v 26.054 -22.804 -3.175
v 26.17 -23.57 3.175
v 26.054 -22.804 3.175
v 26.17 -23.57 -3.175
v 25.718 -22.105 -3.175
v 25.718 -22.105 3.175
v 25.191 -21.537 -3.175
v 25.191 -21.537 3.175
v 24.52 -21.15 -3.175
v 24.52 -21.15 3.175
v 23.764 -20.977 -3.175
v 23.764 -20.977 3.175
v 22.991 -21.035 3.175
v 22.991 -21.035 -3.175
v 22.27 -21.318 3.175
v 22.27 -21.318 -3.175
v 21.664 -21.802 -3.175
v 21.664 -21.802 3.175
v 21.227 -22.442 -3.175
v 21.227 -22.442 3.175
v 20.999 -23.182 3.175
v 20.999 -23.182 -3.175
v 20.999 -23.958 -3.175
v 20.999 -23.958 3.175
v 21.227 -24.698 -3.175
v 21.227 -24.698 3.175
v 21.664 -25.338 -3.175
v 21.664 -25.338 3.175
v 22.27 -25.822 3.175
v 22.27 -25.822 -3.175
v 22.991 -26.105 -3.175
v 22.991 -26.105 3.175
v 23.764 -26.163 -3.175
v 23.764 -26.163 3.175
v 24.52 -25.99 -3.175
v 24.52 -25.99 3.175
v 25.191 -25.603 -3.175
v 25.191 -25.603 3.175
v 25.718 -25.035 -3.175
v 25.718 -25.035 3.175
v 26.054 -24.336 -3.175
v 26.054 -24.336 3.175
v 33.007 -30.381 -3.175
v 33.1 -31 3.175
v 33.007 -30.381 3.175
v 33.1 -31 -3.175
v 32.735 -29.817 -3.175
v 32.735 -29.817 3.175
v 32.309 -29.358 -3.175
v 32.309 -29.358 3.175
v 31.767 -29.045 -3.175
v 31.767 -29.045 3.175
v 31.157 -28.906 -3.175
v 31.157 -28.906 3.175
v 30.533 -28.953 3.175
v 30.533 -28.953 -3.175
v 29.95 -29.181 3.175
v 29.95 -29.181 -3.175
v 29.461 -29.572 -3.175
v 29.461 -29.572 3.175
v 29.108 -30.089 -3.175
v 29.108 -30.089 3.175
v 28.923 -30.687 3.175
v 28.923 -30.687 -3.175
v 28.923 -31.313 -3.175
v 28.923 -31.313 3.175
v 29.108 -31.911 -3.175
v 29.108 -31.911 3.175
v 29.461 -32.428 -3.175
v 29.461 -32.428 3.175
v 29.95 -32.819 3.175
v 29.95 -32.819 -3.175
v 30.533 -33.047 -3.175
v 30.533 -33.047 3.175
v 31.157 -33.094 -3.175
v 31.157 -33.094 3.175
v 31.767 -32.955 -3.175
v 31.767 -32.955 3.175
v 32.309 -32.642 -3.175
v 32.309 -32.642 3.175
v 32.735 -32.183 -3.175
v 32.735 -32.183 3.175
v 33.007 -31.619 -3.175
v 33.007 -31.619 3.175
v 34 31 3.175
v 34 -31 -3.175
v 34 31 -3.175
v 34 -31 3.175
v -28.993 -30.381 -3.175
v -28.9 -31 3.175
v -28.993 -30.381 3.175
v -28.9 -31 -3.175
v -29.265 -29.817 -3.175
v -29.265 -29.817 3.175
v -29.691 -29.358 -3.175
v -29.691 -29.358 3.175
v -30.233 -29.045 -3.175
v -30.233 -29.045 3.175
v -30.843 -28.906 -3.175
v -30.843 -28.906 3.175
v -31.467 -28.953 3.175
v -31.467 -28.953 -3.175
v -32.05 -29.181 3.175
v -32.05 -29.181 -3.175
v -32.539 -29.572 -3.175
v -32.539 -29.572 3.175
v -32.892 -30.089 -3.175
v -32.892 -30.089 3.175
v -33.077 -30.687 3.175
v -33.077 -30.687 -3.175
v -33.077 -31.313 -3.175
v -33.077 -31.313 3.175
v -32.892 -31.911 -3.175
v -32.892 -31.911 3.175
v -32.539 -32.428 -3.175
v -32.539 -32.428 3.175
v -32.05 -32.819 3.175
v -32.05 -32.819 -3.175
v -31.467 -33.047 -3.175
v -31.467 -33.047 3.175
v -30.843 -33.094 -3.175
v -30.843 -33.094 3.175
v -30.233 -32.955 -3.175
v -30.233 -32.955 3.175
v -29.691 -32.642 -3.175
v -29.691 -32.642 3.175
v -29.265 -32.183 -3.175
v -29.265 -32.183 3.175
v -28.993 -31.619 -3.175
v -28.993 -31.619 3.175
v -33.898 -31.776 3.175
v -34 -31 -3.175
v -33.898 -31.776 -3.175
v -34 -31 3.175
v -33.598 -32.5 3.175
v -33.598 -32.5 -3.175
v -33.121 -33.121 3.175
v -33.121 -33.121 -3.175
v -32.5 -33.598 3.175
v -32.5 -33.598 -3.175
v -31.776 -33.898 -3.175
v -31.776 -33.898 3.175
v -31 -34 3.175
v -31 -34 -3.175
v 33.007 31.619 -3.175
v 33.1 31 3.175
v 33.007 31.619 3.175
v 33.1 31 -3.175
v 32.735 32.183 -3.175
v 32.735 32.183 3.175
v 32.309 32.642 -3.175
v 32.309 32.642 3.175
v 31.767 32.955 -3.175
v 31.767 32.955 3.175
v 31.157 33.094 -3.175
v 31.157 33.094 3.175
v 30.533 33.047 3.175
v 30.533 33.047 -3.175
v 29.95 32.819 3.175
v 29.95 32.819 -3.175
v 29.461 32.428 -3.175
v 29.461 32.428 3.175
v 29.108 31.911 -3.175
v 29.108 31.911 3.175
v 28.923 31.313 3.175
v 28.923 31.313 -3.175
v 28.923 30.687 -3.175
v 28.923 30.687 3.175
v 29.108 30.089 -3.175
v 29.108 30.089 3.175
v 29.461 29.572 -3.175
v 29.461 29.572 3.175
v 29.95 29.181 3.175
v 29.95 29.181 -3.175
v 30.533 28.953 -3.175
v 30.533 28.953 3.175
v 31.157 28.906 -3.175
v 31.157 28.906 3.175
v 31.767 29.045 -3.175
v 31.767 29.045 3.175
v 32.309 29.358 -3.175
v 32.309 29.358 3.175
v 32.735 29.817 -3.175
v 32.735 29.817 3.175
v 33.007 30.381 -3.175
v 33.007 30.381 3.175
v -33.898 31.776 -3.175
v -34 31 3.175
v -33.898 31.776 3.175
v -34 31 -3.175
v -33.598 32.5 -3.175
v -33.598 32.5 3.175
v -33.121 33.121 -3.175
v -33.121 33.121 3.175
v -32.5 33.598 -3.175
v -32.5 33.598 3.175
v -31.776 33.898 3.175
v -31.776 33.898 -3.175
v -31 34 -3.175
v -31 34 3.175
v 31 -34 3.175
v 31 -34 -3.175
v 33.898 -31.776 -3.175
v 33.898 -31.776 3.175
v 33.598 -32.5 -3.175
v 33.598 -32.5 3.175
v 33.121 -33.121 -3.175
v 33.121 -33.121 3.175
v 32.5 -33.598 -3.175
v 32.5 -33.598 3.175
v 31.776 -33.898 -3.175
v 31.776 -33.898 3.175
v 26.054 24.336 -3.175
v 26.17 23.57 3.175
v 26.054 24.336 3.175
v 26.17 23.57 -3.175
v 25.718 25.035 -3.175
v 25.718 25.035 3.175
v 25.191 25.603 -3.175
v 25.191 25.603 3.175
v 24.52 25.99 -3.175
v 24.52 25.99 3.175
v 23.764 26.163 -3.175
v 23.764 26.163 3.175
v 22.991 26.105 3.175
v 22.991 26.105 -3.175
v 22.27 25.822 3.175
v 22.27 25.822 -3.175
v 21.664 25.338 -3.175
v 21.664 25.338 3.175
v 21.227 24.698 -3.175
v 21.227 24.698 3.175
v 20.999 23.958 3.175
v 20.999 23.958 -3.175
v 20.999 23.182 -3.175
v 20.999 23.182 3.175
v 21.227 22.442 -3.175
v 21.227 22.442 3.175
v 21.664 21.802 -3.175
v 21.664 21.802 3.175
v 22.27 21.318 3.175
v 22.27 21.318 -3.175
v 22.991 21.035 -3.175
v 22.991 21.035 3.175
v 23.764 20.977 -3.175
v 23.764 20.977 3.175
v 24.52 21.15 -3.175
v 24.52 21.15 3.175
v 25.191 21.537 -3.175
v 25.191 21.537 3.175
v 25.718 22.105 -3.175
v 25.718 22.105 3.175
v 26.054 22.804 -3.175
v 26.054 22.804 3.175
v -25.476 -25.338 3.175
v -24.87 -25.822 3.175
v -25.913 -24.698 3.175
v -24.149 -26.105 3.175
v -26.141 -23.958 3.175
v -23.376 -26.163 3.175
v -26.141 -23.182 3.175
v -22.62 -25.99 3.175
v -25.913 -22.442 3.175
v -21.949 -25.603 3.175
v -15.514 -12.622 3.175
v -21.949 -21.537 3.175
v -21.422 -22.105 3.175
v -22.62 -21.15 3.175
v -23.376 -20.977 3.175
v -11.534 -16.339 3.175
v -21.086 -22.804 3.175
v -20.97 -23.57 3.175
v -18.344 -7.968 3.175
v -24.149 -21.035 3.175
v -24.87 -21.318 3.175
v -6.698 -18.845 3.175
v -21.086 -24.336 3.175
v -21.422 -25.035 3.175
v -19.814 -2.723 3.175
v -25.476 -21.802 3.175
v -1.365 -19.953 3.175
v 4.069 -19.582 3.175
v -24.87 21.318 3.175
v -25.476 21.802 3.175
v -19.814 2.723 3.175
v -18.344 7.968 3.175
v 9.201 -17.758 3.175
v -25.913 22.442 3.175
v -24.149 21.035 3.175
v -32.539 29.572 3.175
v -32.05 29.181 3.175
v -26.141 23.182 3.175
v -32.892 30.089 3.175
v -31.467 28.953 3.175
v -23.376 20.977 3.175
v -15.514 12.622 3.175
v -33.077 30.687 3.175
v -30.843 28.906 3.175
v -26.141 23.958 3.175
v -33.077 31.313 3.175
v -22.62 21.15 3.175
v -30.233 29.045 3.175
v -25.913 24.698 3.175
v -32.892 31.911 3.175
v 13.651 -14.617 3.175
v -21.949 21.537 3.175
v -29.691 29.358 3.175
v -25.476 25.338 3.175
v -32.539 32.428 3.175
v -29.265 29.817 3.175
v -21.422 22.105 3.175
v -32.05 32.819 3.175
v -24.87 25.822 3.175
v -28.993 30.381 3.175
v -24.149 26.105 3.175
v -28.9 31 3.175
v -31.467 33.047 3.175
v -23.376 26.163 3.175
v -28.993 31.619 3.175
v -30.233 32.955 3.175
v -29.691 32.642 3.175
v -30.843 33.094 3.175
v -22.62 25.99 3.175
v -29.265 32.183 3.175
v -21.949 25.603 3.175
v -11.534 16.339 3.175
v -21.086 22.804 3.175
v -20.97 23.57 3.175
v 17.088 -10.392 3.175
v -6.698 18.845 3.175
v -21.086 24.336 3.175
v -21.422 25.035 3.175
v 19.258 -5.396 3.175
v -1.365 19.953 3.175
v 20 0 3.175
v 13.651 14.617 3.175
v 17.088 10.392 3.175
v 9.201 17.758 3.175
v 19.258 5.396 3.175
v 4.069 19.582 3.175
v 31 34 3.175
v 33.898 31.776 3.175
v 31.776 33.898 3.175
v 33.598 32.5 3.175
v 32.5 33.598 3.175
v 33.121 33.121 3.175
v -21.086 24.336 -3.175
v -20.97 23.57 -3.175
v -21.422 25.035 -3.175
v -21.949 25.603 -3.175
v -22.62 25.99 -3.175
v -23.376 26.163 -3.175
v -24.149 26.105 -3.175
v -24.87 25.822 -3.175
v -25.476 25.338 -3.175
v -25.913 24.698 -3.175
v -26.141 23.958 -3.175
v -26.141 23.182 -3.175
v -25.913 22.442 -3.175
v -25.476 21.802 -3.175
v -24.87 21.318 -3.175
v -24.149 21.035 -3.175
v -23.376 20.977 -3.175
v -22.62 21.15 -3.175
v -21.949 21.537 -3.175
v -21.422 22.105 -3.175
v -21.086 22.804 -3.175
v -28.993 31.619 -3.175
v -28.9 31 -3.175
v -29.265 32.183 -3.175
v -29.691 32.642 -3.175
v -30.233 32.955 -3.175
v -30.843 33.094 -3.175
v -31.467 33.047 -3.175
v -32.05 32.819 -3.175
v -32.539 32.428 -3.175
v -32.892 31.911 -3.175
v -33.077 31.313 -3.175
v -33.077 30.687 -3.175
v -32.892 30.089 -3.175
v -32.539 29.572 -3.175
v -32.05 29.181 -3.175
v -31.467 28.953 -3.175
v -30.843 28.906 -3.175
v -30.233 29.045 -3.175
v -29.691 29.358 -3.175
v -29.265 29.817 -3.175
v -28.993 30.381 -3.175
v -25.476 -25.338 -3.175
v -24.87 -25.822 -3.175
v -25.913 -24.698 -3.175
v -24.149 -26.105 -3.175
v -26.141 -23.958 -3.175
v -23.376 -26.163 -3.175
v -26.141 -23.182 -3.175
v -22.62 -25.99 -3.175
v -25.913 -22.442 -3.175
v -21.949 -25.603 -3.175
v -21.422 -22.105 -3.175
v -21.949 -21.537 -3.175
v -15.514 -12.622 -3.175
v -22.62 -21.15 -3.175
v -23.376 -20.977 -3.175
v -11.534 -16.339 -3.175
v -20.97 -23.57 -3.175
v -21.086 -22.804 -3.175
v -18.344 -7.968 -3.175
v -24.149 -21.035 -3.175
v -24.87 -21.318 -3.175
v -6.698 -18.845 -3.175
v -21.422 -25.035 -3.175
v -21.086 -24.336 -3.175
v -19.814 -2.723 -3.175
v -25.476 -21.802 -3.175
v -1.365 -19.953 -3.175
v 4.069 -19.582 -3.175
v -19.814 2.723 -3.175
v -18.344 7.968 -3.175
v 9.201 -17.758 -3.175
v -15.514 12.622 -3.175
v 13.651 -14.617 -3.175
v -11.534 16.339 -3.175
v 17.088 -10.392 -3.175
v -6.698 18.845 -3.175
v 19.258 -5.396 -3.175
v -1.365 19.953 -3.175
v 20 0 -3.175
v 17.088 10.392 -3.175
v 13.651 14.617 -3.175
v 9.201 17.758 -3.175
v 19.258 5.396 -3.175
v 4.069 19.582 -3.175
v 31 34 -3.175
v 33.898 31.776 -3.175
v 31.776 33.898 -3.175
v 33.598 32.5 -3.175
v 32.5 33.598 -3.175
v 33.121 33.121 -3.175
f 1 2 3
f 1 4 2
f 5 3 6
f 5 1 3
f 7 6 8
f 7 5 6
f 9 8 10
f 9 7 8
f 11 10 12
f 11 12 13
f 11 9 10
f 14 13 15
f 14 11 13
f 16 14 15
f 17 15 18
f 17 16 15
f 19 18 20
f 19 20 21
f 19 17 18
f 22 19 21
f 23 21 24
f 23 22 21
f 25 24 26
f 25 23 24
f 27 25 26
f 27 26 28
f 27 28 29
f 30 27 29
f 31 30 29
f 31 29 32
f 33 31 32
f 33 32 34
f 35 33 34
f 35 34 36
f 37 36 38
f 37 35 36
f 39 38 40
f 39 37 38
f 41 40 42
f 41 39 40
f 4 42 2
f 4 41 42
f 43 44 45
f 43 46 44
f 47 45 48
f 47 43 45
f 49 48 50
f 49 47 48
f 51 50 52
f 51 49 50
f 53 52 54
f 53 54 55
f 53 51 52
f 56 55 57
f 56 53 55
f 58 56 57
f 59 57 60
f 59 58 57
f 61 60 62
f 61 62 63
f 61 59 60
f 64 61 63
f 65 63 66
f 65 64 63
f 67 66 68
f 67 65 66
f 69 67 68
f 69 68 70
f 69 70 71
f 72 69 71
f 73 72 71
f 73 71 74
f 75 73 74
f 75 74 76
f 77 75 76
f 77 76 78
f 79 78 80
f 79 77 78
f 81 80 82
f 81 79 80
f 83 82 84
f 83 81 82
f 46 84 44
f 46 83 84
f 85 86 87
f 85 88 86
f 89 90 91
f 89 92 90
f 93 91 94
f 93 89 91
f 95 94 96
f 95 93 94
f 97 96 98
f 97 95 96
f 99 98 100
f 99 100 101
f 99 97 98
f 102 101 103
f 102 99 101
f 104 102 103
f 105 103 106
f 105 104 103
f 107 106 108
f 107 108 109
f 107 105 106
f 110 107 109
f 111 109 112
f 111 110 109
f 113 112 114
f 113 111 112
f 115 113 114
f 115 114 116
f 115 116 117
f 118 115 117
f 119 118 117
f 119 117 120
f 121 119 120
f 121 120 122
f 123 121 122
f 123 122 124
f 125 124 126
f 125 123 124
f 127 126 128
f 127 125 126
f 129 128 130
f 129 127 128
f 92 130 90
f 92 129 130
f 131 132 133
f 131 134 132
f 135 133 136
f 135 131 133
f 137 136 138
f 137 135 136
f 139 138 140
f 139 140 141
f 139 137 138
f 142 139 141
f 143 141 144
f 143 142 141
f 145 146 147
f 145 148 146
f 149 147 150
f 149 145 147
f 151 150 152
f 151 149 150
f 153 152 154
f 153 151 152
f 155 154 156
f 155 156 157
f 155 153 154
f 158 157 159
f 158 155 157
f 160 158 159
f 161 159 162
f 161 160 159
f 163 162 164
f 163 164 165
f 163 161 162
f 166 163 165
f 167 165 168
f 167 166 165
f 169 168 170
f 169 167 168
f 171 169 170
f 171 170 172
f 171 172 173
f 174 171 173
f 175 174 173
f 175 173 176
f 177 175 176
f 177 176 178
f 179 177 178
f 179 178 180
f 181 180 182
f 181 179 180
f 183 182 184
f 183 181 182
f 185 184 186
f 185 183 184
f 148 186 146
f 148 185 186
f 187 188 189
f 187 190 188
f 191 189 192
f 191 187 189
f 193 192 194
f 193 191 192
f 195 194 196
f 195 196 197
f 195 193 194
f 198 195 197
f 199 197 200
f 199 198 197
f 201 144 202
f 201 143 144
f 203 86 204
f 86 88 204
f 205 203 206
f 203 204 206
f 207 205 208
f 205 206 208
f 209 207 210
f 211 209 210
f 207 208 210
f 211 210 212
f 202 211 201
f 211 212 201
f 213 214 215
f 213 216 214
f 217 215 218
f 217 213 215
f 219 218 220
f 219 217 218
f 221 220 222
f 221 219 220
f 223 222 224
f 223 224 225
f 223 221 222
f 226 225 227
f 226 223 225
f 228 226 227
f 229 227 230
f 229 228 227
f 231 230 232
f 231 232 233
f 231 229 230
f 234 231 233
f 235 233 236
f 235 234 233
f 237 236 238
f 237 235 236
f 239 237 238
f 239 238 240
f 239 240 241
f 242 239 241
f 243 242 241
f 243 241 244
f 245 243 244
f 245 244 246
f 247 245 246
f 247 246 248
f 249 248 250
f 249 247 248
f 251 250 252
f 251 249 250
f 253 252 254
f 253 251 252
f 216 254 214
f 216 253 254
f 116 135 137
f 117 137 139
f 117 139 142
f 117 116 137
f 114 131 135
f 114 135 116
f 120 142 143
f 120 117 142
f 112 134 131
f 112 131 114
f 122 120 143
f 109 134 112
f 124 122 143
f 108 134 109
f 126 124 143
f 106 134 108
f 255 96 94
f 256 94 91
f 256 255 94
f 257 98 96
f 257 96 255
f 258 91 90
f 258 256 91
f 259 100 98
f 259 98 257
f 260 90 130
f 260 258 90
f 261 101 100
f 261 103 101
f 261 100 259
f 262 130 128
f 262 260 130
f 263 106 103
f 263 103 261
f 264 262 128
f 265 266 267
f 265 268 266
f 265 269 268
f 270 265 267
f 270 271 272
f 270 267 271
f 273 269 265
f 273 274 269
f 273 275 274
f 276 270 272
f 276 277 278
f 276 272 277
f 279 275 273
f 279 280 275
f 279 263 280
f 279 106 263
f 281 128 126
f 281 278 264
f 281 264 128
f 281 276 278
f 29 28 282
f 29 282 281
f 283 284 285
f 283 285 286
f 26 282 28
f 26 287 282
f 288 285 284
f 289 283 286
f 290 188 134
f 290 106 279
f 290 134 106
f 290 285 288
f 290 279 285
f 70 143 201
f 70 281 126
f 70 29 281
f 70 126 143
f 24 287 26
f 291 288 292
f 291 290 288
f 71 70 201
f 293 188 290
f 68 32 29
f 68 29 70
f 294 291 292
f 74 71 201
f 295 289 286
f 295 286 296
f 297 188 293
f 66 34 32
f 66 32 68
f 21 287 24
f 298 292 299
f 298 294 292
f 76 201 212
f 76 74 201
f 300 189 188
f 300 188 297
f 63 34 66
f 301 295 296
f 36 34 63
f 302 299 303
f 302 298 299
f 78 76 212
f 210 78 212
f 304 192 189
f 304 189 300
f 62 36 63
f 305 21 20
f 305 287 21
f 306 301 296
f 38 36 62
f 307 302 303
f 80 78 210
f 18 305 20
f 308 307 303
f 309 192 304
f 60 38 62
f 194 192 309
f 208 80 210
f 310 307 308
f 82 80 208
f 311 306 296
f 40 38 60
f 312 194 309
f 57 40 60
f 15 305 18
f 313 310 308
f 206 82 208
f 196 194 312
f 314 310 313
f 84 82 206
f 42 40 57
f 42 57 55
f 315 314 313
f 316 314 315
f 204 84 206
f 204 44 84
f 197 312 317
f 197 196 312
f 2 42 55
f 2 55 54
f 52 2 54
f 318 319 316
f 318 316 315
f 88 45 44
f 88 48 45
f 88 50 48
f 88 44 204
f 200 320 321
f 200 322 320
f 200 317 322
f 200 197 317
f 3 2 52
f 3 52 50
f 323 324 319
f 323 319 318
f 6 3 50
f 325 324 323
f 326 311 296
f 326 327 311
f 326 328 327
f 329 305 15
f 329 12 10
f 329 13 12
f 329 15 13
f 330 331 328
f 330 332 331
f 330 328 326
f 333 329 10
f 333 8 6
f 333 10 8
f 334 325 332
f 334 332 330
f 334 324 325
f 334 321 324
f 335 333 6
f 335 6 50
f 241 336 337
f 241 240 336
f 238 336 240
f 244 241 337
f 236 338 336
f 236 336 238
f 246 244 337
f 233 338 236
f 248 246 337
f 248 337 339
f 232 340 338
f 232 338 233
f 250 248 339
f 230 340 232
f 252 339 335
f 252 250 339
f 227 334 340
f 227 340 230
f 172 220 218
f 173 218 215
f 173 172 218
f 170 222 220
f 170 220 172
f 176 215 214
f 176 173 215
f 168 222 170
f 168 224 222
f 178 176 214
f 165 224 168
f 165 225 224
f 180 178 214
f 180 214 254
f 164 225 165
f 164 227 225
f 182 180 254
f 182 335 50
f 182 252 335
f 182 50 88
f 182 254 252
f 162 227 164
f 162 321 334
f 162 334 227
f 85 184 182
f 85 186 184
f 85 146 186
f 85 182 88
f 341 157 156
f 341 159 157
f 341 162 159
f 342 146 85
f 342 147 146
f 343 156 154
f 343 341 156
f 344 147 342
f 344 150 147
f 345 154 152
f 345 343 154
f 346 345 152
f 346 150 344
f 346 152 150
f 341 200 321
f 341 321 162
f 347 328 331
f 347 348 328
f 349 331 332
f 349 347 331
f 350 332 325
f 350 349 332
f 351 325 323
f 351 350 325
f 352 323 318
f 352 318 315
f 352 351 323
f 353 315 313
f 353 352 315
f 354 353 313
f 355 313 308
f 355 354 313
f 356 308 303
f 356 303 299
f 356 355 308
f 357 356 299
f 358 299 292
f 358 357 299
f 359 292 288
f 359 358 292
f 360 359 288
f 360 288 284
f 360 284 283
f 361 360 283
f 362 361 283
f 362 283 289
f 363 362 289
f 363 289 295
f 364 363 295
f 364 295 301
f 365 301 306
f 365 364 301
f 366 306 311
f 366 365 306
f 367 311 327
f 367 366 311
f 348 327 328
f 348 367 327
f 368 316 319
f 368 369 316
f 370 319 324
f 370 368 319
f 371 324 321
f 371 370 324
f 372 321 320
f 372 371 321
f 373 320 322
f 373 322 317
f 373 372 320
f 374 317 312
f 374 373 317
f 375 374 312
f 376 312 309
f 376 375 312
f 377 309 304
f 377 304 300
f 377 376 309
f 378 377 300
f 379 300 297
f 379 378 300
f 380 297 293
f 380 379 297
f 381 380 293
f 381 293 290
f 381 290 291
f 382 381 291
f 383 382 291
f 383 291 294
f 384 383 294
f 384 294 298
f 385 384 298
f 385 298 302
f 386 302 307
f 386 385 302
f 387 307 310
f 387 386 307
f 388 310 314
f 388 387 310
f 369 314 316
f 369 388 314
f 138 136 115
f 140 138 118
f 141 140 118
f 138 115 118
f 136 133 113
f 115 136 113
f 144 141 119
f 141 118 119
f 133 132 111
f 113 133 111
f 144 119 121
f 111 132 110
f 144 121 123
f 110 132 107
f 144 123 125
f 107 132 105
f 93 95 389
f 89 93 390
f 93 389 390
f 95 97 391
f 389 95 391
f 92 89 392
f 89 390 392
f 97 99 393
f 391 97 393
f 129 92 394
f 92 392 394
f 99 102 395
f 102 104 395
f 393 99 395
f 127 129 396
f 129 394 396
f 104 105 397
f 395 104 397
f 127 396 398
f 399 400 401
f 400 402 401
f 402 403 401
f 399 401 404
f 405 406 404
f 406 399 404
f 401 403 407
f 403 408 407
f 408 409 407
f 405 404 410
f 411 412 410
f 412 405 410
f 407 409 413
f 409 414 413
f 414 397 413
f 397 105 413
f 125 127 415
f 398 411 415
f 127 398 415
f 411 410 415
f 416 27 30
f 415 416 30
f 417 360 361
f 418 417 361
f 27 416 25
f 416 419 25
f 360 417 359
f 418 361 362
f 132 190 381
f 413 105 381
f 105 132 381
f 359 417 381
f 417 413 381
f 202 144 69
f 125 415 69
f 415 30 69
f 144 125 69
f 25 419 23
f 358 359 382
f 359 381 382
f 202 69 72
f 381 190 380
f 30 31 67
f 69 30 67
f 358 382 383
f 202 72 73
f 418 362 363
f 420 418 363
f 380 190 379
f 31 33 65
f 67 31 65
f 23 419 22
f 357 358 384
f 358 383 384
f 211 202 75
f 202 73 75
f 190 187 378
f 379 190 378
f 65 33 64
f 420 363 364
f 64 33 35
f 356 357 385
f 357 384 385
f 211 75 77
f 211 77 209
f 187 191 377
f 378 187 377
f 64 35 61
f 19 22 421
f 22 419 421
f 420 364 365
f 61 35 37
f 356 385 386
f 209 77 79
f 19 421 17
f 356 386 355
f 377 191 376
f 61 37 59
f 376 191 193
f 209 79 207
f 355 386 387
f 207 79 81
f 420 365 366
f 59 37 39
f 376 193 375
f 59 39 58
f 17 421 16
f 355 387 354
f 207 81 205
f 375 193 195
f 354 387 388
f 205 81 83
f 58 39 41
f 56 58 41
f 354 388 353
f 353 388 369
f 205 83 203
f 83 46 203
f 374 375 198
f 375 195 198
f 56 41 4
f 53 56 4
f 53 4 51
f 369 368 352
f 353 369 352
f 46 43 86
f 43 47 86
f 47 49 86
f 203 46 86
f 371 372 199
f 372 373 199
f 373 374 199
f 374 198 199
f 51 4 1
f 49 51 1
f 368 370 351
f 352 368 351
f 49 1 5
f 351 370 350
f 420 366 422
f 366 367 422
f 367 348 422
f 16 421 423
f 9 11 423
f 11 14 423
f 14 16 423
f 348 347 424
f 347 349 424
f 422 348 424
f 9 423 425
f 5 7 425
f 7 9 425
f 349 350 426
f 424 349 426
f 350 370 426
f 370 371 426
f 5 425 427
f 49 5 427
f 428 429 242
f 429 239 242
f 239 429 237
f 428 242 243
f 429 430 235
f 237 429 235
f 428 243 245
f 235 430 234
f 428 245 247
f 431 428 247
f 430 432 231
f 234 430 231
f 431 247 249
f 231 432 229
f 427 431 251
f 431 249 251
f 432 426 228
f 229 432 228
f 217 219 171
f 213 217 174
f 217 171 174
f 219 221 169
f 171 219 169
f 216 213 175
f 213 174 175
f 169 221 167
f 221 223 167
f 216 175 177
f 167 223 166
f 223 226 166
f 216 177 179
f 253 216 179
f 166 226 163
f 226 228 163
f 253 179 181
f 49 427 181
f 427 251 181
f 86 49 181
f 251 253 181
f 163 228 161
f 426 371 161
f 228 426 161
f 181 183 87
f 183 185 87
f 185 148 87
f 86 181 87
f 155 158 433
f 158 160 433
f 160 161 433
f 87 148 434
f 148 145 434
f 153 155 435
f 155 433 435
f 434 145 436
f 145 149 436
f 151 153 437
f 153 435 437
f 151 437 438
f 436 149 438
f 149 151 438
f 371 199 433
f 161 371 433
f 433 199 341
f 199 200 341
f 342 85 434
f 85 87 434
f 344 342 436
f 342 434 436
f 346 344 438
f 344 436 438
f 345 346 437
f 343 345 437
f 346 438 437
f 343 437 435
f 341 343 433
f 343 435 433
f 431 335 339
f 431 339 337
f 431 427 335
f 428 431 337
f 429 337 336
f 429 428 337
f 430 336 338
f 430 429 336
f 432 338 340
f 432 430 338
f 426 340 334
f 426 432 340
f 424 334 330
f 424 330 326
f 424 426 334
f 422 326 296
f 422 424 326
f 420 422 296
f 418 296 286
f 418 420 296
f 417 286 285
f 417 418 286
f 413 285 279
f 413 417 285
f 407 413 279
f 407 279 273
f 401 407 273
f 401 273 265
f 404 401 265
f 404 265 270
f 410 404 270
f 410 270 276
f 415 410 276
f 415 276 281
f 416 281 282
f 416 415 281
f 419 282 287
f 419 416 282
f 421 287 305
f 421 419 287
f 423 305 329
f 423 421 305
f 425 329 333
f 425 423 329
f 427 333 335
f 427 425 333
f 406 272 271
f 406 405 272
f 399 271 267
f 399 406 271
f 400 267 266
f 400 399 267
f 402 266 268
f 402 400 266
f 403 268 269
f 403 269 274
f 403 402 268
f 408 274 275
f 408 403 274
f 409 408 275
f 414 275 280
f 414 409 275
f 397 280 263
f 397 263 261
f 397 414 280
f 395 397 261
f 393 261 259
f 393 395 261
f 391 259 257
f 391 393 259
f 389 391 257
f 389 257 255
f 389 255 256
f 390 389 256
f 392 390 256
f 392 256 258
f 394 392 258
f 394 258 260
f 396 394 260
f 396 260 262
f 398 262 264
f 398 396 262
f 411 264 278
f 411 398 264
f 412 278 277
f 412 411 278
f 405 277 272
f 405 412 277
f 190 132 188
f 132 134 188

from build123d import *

# Parameters (mm, degrees)
SKETCH1_W           = 68
SKETCH1_H           = 68
SKETCH1_R           = 2.6
SKETCH1_R_2         = 2.1
SKETCH1_R_3         = 20
BOSS_EXTRUDE1_DEPTH = 3.175
FILLET2_R           = 3


with BuildPart() as part:
    # Sketch1 → Boss-Extrude1 (new, symmetric)
    with BuildSketch(Plane.XY):
        Rectangle(SKETCH1_W, SKETCH1_H)
        with Locations((-23.57, 23.57)):
            Circle(SKETCH1_R, mode=Mode.SUBTRACT)
        with Locations((23.57, 23.57)):
            Circle(SKETCH1_R, mode=Mode.SUBTRACT)
        with Locations((23.57, -23.57)):
            Circle(SKETCH1_R, mode=Mode.SUBTRACT)
        with Locations((-23.57, -23.57)):
            Circle(SKETCH1_R, mode=Mode.SUBTRACT)
        with Locations((-31, 31)):
            Circle(SKETCH1_R_2, mode=Mode.SUBTRACT)
        with Locations((31, 31)):
            Circle(SKETCH1_R_2, mode=Mode.SUBTRACT)
        with Locations((31, -31)):
            Circle(SKETCH1_R_2, mode=Mode.SUBTRACT)
        with Locations((-31, -31)):
            Circle(SKETCH1_R_2, mode=Mode.SUBTRACT)
        Circle(SKETCH1_R_3, mode=Mode.SUBTRACT)
    extrude(amount=BOSS_EXTRUDE1_DEPTH, both=True)

    # Fillet2
    fillet2_edges = [part.edges().sort_by_distance(p)[0] for p in [
        (-34, 34, 0),
        (34, 34, 0),
        (34, -34, 0),
        (-34, -34, 0),
    ]]
    fillet(fillet2_edges, radius=FILLET2_R)


solid = part.part
